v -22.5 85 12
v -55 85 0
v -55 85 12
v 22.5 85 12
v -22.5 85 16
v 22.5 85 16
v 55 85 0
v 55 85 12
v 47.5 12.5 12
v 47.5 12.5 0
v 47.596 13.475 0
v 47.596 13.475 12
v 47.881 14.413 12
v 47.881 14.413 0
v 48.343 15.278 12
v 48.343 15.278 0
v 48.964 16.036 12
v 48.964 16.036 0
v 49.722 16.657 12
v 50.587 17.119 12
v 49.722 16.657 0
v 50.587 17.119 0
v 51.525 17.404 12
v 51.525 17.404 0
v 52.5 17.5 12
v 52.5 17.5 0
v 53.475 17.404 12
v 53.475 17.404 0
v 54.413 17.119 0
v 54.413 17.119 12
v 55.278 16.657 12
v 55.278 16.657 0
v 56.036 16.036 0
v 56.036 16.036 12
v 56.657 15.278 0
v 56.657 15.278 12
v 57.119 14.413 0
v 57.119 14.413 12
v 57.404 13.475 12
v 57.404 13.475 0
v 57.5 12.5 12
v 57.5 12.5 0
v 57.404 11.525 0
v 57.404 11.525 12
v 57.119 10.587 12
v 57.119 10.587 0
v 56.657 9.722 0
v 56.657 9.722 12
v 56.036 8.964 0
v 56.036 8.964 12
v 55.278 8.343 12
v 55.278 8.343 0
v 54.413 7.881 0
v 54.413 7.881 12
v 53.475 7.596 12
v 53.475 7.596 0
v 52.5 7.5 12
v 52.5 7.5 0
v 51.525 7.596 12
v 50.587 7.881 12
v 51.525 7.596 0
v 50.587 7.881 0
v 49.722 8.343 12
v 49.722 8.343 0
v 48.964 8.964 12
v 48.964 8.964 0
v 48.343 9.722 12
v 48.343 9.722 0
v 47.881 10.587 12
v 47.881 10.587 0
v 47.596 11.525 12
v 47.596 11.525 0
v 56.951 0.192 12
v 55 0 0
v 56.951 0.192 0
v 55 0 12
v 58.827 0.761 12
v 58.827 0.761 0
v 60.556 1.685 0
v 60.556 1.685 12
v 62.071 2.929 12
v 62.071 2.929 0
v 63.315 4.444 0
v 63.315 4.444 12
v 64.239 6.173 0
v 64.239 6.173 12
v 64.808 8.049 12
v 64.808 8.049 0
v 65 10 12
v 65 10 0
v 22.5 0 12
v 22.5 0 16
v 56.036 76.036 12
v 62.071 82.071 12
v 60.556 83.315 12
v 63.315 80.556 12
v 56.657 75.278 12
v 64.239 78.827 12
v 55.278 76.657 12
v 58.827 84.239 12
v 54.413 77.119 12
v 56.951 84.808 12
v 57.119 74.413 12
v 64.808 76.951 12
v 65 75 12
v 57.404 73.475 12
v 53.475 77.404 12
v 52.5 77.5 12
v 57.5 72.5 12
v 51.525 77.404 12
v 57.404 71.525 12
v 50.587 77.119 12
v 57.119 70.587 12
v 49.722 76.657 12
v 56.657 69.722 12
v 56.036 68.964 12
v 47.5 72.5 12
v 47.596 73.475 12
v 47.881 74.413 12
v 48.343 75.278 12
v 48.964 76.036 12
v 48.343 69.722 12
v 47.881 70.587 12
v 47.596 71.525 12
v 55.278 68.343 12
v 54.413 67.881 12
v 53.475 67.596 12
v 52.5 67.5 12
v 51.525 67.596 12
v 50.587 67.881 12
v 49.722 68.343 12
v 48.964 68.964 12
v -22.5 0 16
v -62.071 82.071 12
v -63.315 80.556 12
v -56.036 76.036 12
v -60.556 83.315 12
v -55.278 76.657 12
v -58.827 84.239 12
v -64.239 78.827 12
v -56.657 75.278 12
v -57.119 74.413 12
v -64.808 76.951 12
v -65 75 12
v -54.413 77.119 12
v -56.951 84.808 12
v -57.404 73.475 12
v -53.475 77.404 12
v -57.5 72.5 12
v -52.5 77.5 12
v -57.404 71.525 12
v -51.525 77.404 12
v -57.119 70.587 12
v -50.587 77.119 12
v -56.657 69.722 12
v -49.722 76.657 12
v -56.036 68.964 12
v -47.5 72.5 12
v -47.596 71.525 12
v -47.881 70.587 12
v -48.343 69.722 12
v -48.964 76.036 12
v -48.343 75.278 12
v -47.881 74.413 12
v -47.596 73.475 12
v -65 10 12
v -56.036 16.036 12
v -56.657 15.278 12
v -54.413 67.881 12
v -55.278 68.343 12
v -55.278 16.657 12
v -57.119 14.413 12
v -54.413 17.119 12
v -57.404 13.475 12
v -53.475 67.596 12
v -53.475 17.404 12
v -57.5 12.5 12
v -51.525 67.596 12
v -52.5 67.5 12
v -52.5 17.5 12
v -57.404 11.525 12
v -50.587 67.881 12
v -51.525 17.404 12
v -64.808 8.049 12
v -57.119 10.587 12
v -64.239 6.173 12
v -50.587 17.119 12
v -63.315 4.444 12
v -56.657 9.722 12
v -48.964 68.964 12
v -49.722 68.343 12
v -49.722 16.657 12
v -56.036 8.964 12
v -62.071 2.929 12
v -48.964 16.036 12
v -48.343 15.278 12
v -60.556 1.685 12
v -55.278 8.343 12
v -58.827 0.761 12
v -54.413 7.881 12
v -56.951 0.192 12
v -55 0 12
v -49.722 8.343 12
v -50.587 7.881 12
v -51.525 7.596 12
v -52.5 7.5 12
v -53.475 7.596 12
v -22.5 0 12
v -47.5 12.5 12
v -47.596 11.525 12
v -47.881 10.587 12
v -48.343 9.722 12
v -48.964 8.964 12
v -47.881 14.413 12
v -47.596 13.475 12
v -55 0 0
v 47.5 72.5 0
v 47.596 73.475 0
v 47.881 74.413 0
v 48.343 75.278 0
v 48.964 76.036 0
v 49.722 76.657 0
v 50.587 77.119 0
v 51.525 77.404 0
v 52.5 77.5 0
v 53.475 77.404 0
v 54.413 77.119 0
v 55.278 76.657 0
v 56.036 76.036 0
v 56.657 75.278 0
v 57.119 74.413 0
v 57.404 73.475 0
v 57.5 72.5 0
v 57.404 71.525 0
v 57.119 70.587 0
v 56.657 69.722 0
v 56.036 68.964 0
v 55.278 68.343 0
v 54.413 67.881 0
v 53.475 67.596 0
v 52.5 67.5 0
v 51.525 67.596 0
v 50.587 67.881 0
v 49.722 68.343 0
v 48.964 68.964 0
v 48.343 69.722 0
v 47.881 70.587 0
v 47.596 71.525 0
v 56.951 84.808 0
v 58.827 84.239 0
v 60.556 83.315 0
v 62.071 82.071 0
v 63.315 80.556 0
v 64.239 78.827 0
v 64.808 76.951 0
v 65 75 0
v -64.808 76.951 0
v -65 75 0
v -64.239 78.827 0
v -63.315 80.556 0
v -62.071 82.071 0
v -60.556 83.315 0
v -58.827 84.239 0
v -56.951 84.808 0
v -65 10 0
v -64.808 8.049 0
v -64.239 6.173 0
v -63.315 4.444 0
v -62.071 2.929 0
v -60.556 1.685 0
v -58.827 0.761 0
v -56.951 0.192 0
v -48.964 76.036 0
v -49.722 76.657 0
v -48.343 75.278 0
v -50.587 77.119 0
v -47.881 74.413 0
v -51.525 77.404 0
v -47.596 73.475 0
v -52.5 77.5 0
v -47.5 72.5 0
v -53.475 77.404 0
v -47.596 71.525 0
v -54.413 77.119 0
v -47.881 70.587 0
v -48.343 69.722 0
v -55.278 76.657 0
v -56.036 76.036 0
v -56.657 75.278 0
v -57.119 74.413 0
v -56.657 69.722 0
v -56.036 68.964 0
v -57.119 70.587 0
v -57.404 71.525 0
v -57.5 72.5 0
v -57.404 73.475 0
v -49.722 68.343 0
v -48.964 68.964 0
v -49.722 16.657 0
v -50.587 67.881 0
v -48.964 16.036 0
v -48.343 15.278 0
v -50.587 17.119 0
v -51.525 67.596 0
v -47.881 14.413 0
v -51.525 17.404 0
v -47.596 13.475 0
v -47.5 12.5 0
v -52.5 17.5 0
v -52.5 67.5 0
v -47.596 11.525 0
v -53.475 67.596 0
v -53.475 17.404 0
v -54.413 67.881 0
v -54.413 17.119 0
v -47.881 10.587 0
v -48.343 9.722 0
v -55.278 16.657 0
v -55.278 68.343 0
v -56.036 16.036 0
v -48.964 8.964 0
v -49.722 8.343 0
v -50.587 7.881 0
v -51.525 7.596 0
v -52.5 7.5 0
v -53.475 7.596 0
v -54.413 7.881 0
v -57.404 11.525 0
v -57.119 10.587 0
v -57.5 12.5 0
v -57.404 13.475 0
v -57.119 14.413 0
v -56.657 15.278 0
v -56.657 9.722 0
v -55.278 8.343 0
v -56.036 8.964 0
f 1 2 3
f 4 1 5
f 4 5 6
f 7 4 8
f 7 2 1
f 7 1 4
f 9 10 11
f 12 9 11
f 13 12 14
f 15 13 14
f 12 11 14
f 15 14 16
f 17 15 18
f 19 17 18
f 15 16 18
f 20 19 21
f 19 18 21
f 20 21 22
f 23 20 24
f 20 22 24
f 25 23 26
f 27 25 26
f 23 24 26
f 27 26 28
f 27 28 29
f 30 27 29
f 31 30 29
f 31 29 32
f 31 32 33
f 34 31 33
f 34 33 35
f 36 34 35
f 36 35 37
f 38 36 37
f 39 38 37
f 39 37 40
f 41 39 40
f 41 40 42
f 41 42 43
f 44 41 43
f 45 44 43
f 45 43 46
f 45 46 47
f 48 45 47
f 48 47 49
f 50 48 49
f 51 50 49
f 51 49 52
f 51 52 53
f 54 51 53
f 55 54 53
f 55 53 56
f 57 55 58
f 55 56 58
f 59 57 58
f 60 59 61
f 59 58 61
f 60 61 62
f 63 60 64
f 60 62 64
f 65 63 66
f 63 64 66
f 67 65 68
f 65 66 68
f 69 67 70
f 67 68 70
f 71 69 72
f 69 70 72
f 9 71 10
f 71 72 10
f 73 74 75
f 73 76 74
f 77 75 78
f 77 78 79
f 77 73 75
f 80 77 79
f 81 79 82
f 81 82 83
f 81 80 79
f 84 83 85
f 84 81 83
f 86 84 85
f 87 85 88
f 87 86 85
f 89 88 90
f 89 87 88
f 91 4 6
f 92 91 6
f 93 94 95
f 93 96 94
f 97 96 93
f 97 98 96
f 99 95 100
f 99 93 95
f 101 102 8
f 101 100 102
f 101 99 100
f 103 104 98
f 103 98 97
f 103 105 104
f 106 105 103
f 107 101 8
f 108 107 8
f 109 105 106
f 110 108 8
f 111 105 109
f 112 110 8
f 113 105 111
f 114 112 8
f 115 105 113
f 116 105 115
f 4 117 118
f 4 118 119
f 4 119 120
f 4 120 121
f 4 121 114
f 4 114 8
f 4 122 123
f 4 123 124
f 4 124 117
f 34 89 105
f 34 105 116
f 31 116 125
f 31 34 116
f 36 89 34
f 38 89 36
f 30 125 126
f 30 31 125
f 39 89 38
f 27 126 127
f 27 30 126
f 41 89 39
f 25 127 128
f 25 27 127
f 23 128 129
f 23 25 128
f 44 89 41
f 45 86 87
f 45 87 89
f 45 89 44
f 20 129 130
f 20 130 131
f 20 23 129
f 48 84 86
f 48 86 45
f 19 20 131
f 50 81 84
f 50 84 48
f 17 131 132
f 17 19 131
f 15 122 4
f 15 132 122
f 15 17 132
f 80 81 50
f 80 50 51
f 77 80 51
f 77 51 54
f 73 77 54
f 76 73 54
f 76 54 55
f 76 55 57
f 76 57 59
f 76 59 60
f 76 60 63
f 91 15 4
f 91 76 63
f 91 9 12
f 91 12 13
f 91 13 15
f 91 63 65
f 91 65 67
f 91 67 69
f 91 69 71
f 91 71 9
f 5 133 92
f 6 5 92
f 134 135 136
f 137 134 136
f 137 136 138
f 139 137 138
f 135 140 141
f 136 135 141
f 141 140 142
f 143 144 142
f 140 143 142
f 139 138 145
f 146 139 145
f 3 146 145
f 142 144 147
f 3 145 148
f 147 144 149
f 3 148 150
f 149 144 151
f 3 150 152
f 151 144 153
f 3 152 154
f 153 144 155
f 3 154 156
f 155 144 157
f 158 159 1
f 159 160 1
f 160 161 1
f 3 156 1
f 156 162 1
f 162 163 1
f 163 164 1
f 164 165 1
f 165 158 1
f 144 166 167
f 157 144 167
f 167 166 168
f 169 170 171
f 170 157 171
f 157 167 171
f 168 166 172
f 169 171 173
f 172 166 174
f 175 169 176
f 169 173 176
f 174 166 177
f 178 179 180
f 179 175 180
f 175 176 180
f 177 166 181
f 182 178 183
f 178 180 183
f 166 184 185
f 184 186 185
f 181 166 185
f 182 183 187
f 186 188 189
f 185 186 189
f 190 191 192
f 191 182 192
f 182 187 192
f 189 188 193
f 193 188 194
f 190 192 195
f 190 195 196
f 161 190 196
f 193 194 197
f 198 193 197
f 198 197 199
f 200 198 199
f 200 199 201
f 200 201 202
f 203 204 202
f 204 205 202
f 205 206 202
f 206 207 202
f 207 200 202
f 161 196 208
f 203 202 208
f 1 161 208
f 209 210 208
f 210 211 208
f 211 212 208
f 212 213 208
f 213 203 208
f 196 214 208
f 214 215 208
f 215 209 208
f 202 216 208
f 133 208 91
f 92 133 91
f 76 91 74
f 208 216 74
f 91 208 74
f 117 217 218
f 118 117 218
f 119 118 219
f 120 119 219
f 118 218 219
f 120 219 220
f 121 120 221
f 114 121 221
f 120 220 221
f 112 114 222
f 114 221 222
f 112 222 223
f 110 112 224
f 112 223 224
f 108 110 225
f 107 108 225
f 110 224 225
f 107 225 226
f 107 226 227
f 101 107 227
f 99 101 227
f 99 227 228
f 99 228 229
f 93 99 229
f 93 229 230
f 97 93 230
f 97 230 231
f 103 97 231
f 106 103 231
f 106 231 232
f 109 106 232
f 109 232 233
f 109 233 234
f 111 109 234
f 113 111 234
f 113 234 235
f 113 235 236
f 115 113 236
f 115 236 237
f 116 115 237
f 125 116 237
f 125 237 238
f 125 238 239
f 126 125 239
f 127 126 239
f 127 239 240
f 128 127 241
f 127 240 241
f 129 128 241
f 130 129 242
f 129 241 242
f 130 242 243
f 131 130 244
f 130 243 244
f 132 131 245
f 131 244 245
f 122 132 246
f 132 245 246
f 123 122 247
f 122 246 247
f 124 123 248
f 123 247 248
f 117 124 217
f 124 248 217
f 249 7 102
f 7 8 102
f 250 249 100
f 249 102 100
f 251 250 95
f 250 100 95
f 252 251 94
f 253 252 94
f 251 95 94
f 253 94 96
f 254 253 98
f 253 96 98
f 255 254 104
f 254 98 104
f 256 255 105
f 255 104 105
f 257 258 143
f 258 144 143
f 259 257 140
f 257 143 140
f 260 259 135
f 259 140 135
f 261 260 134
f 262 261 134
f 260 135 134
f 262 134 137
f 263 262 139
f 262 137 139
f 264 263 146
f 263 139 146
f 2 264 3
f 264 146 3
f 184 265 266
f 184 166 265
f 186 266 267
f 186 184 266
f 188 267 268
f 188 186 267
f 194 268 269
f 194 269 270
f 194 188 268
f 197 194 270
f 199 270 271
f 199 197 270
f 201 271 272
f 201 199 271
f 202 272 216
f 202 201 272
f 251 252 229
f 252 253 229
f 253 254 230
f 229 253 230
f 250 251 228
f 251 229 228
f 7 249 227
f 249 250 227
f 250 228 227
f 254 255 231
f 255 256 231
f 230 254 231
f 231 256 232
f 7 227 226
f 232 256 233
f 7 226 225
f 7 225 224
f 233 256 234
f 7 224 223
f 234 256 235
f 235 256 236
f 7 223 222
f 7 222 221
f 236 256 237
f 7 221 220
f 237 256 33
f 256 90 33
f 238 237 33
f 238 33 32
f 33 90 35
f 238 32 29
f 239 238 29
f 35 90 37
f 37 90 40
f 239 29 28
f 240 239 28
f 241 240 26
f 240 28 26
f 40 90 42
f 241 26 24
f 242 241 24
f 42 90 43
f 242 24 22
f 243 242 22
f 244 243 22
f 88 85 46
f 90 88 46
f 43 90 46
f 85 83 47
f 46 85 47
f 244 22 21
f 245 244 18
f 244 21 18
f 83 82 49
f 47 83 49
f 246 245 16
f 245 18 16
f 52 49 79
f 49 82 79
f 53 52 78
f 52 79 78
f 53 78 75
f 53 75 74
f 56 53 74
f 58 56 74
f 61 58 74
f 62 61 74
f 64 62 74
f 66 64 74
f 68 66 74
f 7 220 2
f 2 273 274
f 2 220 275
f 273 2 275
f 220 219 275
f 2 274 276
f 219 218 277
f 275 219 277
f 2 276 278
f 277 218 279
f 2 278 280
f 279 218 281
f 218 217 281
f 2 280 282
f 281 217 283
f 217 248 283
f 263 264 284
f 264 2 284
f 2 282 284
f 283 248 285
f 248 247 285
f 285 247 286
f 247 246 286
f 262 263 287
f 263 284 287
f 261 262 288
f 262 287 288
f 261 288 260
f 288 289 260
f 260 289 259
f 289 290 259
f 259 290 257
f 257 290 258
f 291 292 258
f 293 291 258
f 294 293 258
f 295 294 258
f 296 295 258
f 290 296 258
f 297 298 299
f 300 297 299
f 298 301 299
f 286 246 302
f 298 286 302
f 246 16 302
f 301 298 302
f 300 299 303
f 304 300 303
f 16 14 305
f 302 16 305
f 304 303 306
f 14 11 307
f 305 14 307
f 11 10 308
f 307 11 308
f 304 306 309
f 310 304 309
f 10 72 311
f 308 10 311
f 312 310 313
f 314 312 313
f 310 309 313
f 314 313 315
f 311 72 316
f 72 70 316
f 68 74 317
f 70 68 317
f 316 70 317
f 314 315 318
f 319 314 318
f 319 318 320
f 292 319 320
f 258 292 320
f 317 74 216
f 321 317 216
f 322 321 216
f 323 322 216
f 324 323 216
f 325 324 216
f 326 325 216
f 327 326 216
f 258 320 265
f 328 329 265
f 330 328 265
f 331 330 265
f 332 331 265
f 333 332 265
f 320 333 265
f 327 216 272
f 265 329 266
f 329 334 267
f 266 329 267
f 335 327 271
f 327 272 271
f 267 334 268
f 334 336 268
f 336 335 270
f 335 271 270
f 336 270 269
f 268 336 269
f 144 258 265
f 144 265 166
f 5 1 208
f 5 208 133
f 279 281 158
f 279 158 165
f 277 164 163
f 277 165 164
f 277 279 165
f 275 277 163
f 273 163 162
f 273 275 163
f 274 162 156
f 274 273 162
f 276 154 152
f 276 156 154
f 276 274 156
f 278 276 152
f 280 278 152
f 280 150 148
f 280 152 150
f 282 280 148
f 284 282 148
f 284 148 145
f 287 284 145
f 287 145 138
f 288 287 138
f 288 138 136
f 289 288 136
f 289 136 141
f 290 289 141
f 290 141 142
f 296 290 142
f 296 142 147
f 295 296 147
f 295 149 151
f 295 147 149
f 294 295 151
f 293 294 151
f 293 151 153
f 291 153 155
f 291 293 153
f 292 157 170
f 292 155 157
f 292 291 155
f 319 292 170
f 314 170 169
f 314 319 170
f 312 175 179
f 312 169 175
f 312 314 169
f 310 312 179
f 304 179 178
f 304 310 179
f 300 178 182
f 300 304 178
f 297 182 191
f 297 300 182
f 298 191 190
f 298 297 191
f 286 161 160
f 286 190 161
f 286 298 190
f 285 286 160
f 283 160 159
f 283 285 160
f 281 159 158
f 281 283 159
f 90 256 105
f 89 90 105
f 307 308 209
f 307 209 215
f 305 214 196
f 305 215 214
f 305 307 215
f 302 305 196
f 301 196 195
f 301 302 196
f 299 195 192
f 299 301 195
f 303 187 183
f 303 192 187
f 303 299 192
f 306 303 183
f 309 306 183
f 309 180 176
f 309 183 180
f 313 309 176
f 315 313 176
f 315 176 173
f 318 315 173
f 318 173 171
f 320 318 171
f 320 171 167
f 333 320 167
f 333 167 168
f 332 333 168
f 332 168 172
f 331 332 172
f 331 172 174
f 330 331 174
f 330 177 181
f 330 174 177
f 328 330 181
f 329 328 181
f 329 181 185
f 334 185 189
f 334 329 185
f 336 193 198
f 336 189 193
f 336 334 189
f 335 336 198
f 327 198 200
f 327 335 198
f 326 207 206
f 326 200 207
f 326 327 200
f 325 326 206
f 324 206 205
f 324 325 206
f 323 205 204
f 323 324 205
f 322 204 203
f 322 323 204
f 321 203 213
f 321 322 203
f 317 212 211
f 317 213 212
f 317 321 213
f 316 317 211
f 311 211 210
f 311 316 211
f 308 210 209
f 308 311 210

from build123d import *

# Parameters (mm, degrees)
EXTRUDE1_DEPTH          = 85
M10X1_25_TAPPED_HOLE1_D = 10
FILLET1_R               = 10
FILLET1_OF_MIRROR1_R    = 10


with BuildPart() as part:
    # Sketch1 → Extrude1 (new body)
    with BuildSketch(Plane(origin=(0, 0, 0), x_dir=(1, 0, 0), z_dir=(0, 1, 0))):
        Polygon((0, 0), (65, 0), (65, -12), (22.5, -12), (22.5, -16), (0, -16), align=None)
    extrude1 = extrude(amount=EXTRUDE1_DEPTH)

    # M10x1.25 Tapped Hole1 (through all)
    with Locations(Plane.XY.offset(12)):
        with Locations((52.5, 12.5), (52.5, 72.5)):
            m10x1_25_tapped_hole1 = Hole(M10X1_25_TAPPED_HOLE1_D / 2)

    # Fillet1
    fillet1_edges = [part.edges().sort_by_distance(p)[0] for p in [
        (65, 85, 6),
        (65, 0, 6),
    ]]
    fillet(fillet1_edges, radius=FILLET1_R)

    # Mirror1: Extrude1, M10x1.25 Tapped Hole1 across plane
    add(extrude1.mirror(Plane(origin=(0, 0, 0), x_dir=(0, 0, 1), z_dir=(1, 0, 0))))
    add(m10x1_25_tapped_hole1.mirror(Plane(origin=(0, 0, 0), x_dir=(0, 0, 1), z_dir=(1, 0, 0))), mode=Mode.SUBTRACT)

    # Fillet1 of Mirror1
    fillet1_of_mirror1_edges = [part.edges().sort_by_distance(p)[0] for p in [
        (-65, 85, 6),
        (-65, 0, 6),
    ]]
    fillet(fillet1_of_mirror1_edges, radius=FILLET1_OF_MIRROR1_R)


solid = part.part
